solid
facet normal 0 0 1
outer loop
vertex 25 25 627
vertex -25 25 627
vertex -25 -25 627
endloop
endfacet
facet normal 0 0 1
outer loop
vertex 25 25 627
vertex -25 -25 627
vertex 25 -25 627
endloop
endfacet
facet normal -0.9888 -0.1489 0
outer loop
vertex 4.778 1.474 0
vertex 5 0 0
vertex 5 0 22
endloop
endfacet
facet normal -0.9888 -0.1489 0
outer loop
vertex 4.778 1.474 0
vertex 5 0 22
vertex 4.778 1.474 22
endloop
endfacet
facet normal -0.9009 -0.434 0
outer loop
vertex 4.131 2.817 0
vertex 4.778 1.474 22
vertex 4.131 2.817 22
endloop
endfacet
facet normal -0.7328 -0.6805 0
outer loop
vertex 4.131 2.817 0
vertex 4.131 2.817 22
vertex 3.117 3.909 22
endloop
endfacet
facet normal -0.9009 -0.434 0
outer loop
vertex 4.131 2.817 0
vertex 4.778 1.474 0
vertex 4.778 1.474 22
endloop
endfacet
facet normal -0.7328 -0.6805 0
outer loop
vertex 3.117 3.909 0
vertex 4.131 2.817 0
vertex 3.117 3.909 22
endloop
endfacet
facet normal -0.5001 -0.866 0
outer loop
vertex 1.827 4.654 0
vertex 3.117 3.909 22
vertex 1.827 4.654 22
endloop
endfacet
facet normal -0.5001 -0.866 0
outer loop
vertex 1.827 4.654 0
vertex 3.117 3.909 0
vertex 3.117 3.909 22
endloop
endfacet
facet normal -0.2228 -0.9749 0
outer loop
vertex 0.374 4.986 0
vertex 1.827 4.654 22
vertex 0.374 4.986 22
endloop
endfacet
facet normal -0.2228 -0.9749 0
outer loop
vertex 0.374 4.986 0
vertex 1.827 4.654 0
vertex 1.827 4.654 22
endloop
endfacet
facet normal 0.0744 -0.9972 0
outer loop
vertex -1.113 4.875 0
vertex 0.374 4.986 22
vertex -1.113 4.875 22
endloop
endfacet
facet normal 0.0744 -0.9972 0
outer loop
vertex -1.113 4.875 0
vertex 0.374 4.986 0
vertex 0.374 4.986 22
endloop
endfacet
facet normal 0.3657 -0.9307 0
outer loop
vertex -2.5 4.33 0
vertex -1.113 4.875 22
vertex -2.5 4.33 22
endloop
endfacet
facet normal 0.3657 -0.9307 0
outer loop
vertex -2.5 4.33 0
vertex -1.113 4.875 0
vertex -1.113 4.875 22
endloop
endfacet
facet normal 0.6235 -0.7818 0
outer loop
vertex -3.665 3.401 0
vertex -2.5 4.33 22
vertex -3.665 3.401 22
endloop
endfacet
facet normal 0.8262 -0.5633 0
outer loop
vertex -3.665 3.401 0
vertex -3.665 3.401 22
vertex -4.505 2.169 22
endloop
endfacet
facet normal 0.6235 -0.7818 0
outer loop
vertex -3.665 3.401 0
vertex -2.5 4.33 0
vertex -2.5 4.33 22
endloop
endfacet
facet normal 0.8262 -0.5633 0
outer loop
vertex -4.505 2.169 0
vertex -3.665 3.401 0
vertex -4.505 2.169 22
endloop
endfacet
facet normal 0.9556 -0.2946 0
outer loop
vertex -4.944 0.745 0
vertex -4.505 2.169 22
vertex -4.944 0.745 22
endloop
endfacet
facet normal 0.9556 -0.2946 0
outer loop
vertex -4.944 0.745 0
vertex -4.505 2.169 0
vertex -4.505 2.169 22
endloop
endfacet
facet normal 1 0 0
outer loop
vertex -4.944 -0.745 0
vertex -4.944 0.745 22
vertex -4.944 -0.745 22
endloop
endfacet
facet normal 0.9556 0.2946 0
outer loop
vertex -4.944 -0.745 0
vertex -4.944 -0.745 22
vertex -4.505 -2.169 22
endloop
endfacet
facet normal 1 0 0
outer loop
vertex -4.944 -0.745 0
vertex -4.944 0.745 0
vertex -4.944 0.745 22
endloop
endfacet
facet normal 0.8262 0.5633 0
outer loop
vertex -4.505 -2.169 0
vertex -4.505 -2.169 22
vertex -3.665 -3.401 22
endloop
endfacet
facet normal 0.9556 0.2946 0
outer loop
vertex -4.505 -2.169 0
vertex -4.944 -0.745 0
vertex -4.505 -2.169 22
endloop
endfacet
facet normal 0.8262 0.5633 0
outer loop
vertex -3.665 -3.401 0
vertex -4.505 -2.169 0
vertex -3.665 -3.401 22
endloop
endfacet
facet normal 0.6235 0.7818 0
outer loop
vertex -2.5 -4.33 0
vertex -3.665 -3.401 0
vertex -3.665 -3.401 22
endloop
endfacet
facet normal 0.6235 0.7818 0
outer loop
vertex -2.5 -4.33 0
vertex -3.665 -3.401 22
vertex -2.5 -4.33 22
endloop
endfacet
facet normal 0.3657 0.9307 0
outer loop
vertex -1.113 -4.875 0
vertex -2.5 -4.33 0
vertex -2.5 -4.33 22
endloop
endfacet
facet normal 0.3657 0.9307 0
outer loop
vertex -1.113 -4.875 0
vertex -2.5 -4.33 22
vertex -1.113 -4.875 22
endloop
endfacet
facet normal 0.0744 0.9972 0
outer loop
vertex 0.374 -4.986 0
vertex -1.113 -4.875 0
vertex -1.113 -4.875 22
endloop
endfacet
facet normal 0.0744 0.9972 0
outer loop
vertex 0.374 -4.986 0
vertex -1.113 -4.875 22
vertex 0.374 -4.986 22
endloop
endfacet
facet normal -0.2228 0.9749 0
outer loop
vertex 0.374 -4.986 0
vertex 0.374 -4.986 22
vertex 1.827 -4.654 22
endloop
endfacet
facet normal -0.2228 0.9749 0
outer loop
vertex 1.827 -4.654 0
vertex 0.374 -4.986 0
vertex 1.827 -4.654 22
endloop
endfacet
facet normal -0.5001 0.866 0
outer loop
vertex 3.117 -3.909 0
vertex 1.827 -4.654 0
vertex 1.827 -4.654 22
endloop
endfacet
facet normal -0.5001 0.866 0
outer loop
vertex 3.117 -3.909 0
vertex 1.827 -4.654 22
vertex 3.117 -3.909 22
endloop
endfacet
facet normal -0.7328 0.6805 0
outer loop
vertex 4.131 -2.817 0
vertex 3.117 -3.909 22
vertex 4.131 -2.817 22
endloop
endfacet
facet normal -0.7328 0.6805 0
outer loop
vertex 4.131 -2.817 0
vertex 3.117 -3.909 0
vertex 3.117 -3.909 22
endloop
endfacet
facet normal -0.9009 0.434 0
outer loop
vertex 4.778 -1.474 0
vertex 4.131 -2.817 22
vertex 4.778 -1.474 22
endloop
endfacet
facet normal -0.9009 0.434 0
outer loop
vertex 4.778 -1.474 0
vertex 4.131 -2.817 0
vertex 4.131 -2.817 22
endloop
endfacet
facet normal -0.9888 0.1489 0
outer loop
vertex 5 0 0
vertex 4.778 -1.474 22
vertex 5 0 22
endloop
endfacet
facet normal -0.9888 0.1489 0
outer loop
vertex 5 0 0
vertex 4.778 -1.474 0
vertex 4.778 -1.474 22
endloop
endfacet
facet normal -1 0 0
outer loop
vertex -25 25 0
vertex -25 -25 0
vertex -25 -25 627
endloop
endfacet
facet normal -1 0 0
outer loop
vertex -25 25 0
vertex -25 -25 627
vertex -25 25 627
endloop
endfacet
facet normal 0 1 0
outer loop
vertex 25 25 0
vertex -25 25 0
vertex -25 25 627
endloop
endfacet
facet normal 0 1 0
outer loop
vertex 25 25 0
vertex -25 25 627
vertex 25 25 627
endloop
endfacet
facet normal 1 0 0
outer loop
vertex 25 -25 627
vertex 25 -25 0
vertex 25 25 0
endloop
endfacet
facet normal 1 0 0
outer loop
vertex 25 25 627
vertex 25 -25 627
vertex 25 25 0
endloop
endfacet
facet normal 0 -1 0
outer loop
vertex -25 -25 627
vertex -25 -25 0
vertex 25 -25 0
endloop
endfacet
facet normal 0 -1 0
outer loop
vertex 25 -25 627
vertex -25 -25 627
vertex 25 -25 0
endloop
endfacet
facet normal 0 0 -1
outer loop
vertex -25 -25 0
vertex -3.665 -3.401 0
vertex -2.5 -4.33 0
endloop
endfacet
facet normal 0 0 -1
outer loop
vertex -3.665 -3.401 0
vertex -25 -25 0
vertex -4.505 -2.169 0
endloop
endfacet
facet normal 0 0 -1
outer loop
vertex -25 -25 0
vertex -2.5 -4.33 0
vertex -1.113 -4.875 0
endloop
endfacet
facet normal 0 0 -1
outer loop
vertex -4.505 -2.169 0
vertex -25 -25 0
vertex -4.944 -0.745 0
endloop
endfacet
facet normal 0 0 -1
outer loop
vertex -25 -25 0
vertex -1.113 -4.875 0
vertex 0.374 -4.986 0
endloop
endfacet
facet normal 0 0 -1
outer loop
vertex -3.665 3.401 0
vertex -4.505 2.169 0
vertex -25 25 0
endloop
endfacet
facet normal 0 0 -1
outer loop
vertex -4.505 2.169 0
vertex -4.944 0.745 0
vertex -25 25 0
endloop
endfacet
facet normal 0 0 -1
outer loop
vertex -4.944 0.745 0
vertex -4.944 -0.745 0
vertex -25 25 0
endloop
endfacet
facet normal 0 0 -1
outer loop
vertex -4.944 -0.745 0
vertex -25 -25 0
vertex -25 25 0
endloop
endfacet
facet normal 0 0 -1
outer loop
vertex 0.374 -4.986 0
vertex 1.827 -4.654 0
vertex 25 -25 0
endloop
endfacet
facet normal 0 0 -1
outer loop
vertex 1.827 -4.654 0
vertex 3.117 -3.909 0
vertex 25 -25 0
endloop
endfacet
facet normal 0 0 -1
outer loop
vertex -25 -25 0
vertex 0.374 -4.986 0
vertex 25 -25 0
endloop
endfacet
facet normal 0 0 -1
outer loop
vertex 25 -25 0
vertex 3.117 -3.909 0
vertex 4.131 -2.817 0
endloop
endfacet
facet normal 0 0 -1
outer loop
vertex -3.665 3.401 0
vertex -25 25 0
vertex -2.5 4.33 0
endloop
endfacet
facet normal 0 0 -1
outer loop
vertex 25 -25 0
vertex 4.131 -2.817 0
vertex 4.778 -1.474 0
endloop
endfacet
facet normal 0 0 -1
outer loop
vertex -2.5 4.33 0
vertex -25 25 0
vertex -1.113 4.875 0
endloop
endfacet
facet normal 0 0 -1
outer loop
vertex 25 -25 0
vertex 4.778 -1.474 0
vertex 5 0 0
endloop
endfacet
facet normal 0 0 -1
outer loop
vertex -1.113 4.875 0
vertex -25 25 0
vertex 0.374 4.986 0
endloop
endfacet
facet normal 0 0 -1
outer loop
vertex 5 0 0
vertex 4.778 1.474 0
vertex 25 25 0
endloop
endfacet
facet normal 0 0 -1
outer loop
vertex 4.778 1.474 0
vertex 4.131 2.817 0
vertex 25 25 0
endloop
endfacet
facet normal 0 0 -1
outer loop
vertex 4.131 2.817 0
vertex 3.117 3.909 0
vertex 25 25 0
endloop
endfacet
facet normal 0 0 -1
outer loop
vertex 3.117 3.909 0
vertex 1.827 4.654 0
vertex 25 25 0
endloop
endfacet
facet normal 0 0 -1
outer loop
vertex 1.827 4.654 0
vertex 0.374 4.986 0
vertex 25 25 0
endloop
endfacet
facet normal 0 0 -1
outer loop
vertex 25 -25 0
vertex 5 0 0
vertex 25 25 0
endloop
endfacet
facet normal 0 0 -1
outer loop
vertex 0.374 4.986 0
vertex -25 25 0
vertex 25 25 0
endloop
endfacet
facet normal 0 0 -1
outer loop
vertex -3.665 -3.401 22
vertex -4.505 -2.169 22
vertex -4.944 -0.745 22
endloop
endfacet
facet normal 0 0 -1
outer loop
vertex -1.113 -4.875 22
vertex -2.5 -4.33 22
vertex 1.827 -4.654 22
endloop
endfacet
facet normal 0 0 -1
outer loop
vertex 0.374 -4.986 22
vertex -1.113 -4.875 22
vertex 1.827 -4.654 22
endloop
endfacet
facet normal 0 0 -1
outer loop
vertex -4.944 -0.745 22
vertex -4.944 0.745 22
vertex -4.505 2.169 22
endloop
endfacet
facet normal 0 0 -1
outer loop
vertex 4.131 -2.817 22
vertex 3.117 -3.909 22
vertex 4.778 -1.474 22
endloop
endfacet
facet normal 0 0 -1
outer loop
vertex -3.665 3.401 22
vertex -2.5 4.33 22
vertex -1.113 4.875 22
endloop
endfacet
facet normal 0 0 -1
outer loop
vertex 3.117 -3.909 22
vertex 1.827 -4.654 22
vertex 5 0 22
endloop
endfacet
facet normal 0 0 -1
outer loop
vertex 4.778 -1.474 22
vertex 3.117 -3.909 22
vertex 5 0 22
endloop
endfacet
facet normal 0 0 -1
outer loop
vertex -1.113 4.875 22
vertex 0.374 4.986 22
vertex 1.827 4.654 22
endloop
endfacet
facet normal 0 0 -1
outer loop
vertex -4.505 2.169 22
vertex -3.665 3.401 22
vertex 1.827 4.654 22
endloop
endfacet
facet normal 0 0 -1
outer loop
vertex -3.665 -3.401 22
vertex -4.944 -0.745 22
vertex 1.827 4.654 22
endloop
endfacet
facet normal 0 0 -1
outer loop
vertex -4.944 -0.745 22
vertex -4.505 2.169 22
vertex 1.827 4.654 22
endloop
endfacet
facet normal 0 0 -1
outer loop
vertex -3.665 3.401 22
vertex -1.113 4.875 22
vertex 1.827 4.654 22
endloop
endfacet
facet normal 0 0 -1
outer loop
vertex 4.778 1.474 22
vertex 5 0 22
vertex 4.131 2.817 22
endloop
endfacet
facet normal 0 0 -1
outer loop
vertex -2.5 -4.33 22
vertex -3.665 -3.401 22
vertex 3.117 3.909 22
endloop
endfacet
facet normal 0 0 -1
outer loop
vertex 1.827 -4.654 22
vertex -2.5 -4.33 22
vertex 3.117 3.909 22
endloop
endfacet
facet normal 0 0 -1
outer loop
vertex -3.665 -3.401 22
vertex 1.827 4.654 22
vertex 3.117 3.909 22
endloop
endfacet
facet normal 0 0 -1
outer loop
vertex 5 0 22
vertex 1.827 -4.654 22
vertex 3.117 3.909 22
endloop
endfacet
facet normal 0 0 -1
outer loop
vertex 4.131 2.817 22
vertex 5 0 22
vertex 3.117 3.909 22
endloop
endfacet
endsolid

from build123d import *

# Parameters (mm, degrees)
SKETCH1_W           = 50
SKETCH1_H           = 50
BOSS_EXTRUDE1_DEPTH = 627
SKETCH2_R           = 5
CUT_EXTRUDE3_DEPTH  = 22


with BuildPart() as part:
    # Sketch1 → Boss-Extrude1 (new body)
    with BuildSketch(Plane.XY):
        Rectangle(SKETCH1_W, SKETCH1_H)
    extrude(amount=BOSS_EXTRUDE1_DEPTH)

    # Sketch2 → Cut-Extrude3 (cut)
    with BuildSketch(Plane.XY):
        Circle(SKETCH2_R)
    extrude(amount=CUT_EXTRUDE3_DEPTH, mode=Mode.SUBTRACT)


solid = part.part
